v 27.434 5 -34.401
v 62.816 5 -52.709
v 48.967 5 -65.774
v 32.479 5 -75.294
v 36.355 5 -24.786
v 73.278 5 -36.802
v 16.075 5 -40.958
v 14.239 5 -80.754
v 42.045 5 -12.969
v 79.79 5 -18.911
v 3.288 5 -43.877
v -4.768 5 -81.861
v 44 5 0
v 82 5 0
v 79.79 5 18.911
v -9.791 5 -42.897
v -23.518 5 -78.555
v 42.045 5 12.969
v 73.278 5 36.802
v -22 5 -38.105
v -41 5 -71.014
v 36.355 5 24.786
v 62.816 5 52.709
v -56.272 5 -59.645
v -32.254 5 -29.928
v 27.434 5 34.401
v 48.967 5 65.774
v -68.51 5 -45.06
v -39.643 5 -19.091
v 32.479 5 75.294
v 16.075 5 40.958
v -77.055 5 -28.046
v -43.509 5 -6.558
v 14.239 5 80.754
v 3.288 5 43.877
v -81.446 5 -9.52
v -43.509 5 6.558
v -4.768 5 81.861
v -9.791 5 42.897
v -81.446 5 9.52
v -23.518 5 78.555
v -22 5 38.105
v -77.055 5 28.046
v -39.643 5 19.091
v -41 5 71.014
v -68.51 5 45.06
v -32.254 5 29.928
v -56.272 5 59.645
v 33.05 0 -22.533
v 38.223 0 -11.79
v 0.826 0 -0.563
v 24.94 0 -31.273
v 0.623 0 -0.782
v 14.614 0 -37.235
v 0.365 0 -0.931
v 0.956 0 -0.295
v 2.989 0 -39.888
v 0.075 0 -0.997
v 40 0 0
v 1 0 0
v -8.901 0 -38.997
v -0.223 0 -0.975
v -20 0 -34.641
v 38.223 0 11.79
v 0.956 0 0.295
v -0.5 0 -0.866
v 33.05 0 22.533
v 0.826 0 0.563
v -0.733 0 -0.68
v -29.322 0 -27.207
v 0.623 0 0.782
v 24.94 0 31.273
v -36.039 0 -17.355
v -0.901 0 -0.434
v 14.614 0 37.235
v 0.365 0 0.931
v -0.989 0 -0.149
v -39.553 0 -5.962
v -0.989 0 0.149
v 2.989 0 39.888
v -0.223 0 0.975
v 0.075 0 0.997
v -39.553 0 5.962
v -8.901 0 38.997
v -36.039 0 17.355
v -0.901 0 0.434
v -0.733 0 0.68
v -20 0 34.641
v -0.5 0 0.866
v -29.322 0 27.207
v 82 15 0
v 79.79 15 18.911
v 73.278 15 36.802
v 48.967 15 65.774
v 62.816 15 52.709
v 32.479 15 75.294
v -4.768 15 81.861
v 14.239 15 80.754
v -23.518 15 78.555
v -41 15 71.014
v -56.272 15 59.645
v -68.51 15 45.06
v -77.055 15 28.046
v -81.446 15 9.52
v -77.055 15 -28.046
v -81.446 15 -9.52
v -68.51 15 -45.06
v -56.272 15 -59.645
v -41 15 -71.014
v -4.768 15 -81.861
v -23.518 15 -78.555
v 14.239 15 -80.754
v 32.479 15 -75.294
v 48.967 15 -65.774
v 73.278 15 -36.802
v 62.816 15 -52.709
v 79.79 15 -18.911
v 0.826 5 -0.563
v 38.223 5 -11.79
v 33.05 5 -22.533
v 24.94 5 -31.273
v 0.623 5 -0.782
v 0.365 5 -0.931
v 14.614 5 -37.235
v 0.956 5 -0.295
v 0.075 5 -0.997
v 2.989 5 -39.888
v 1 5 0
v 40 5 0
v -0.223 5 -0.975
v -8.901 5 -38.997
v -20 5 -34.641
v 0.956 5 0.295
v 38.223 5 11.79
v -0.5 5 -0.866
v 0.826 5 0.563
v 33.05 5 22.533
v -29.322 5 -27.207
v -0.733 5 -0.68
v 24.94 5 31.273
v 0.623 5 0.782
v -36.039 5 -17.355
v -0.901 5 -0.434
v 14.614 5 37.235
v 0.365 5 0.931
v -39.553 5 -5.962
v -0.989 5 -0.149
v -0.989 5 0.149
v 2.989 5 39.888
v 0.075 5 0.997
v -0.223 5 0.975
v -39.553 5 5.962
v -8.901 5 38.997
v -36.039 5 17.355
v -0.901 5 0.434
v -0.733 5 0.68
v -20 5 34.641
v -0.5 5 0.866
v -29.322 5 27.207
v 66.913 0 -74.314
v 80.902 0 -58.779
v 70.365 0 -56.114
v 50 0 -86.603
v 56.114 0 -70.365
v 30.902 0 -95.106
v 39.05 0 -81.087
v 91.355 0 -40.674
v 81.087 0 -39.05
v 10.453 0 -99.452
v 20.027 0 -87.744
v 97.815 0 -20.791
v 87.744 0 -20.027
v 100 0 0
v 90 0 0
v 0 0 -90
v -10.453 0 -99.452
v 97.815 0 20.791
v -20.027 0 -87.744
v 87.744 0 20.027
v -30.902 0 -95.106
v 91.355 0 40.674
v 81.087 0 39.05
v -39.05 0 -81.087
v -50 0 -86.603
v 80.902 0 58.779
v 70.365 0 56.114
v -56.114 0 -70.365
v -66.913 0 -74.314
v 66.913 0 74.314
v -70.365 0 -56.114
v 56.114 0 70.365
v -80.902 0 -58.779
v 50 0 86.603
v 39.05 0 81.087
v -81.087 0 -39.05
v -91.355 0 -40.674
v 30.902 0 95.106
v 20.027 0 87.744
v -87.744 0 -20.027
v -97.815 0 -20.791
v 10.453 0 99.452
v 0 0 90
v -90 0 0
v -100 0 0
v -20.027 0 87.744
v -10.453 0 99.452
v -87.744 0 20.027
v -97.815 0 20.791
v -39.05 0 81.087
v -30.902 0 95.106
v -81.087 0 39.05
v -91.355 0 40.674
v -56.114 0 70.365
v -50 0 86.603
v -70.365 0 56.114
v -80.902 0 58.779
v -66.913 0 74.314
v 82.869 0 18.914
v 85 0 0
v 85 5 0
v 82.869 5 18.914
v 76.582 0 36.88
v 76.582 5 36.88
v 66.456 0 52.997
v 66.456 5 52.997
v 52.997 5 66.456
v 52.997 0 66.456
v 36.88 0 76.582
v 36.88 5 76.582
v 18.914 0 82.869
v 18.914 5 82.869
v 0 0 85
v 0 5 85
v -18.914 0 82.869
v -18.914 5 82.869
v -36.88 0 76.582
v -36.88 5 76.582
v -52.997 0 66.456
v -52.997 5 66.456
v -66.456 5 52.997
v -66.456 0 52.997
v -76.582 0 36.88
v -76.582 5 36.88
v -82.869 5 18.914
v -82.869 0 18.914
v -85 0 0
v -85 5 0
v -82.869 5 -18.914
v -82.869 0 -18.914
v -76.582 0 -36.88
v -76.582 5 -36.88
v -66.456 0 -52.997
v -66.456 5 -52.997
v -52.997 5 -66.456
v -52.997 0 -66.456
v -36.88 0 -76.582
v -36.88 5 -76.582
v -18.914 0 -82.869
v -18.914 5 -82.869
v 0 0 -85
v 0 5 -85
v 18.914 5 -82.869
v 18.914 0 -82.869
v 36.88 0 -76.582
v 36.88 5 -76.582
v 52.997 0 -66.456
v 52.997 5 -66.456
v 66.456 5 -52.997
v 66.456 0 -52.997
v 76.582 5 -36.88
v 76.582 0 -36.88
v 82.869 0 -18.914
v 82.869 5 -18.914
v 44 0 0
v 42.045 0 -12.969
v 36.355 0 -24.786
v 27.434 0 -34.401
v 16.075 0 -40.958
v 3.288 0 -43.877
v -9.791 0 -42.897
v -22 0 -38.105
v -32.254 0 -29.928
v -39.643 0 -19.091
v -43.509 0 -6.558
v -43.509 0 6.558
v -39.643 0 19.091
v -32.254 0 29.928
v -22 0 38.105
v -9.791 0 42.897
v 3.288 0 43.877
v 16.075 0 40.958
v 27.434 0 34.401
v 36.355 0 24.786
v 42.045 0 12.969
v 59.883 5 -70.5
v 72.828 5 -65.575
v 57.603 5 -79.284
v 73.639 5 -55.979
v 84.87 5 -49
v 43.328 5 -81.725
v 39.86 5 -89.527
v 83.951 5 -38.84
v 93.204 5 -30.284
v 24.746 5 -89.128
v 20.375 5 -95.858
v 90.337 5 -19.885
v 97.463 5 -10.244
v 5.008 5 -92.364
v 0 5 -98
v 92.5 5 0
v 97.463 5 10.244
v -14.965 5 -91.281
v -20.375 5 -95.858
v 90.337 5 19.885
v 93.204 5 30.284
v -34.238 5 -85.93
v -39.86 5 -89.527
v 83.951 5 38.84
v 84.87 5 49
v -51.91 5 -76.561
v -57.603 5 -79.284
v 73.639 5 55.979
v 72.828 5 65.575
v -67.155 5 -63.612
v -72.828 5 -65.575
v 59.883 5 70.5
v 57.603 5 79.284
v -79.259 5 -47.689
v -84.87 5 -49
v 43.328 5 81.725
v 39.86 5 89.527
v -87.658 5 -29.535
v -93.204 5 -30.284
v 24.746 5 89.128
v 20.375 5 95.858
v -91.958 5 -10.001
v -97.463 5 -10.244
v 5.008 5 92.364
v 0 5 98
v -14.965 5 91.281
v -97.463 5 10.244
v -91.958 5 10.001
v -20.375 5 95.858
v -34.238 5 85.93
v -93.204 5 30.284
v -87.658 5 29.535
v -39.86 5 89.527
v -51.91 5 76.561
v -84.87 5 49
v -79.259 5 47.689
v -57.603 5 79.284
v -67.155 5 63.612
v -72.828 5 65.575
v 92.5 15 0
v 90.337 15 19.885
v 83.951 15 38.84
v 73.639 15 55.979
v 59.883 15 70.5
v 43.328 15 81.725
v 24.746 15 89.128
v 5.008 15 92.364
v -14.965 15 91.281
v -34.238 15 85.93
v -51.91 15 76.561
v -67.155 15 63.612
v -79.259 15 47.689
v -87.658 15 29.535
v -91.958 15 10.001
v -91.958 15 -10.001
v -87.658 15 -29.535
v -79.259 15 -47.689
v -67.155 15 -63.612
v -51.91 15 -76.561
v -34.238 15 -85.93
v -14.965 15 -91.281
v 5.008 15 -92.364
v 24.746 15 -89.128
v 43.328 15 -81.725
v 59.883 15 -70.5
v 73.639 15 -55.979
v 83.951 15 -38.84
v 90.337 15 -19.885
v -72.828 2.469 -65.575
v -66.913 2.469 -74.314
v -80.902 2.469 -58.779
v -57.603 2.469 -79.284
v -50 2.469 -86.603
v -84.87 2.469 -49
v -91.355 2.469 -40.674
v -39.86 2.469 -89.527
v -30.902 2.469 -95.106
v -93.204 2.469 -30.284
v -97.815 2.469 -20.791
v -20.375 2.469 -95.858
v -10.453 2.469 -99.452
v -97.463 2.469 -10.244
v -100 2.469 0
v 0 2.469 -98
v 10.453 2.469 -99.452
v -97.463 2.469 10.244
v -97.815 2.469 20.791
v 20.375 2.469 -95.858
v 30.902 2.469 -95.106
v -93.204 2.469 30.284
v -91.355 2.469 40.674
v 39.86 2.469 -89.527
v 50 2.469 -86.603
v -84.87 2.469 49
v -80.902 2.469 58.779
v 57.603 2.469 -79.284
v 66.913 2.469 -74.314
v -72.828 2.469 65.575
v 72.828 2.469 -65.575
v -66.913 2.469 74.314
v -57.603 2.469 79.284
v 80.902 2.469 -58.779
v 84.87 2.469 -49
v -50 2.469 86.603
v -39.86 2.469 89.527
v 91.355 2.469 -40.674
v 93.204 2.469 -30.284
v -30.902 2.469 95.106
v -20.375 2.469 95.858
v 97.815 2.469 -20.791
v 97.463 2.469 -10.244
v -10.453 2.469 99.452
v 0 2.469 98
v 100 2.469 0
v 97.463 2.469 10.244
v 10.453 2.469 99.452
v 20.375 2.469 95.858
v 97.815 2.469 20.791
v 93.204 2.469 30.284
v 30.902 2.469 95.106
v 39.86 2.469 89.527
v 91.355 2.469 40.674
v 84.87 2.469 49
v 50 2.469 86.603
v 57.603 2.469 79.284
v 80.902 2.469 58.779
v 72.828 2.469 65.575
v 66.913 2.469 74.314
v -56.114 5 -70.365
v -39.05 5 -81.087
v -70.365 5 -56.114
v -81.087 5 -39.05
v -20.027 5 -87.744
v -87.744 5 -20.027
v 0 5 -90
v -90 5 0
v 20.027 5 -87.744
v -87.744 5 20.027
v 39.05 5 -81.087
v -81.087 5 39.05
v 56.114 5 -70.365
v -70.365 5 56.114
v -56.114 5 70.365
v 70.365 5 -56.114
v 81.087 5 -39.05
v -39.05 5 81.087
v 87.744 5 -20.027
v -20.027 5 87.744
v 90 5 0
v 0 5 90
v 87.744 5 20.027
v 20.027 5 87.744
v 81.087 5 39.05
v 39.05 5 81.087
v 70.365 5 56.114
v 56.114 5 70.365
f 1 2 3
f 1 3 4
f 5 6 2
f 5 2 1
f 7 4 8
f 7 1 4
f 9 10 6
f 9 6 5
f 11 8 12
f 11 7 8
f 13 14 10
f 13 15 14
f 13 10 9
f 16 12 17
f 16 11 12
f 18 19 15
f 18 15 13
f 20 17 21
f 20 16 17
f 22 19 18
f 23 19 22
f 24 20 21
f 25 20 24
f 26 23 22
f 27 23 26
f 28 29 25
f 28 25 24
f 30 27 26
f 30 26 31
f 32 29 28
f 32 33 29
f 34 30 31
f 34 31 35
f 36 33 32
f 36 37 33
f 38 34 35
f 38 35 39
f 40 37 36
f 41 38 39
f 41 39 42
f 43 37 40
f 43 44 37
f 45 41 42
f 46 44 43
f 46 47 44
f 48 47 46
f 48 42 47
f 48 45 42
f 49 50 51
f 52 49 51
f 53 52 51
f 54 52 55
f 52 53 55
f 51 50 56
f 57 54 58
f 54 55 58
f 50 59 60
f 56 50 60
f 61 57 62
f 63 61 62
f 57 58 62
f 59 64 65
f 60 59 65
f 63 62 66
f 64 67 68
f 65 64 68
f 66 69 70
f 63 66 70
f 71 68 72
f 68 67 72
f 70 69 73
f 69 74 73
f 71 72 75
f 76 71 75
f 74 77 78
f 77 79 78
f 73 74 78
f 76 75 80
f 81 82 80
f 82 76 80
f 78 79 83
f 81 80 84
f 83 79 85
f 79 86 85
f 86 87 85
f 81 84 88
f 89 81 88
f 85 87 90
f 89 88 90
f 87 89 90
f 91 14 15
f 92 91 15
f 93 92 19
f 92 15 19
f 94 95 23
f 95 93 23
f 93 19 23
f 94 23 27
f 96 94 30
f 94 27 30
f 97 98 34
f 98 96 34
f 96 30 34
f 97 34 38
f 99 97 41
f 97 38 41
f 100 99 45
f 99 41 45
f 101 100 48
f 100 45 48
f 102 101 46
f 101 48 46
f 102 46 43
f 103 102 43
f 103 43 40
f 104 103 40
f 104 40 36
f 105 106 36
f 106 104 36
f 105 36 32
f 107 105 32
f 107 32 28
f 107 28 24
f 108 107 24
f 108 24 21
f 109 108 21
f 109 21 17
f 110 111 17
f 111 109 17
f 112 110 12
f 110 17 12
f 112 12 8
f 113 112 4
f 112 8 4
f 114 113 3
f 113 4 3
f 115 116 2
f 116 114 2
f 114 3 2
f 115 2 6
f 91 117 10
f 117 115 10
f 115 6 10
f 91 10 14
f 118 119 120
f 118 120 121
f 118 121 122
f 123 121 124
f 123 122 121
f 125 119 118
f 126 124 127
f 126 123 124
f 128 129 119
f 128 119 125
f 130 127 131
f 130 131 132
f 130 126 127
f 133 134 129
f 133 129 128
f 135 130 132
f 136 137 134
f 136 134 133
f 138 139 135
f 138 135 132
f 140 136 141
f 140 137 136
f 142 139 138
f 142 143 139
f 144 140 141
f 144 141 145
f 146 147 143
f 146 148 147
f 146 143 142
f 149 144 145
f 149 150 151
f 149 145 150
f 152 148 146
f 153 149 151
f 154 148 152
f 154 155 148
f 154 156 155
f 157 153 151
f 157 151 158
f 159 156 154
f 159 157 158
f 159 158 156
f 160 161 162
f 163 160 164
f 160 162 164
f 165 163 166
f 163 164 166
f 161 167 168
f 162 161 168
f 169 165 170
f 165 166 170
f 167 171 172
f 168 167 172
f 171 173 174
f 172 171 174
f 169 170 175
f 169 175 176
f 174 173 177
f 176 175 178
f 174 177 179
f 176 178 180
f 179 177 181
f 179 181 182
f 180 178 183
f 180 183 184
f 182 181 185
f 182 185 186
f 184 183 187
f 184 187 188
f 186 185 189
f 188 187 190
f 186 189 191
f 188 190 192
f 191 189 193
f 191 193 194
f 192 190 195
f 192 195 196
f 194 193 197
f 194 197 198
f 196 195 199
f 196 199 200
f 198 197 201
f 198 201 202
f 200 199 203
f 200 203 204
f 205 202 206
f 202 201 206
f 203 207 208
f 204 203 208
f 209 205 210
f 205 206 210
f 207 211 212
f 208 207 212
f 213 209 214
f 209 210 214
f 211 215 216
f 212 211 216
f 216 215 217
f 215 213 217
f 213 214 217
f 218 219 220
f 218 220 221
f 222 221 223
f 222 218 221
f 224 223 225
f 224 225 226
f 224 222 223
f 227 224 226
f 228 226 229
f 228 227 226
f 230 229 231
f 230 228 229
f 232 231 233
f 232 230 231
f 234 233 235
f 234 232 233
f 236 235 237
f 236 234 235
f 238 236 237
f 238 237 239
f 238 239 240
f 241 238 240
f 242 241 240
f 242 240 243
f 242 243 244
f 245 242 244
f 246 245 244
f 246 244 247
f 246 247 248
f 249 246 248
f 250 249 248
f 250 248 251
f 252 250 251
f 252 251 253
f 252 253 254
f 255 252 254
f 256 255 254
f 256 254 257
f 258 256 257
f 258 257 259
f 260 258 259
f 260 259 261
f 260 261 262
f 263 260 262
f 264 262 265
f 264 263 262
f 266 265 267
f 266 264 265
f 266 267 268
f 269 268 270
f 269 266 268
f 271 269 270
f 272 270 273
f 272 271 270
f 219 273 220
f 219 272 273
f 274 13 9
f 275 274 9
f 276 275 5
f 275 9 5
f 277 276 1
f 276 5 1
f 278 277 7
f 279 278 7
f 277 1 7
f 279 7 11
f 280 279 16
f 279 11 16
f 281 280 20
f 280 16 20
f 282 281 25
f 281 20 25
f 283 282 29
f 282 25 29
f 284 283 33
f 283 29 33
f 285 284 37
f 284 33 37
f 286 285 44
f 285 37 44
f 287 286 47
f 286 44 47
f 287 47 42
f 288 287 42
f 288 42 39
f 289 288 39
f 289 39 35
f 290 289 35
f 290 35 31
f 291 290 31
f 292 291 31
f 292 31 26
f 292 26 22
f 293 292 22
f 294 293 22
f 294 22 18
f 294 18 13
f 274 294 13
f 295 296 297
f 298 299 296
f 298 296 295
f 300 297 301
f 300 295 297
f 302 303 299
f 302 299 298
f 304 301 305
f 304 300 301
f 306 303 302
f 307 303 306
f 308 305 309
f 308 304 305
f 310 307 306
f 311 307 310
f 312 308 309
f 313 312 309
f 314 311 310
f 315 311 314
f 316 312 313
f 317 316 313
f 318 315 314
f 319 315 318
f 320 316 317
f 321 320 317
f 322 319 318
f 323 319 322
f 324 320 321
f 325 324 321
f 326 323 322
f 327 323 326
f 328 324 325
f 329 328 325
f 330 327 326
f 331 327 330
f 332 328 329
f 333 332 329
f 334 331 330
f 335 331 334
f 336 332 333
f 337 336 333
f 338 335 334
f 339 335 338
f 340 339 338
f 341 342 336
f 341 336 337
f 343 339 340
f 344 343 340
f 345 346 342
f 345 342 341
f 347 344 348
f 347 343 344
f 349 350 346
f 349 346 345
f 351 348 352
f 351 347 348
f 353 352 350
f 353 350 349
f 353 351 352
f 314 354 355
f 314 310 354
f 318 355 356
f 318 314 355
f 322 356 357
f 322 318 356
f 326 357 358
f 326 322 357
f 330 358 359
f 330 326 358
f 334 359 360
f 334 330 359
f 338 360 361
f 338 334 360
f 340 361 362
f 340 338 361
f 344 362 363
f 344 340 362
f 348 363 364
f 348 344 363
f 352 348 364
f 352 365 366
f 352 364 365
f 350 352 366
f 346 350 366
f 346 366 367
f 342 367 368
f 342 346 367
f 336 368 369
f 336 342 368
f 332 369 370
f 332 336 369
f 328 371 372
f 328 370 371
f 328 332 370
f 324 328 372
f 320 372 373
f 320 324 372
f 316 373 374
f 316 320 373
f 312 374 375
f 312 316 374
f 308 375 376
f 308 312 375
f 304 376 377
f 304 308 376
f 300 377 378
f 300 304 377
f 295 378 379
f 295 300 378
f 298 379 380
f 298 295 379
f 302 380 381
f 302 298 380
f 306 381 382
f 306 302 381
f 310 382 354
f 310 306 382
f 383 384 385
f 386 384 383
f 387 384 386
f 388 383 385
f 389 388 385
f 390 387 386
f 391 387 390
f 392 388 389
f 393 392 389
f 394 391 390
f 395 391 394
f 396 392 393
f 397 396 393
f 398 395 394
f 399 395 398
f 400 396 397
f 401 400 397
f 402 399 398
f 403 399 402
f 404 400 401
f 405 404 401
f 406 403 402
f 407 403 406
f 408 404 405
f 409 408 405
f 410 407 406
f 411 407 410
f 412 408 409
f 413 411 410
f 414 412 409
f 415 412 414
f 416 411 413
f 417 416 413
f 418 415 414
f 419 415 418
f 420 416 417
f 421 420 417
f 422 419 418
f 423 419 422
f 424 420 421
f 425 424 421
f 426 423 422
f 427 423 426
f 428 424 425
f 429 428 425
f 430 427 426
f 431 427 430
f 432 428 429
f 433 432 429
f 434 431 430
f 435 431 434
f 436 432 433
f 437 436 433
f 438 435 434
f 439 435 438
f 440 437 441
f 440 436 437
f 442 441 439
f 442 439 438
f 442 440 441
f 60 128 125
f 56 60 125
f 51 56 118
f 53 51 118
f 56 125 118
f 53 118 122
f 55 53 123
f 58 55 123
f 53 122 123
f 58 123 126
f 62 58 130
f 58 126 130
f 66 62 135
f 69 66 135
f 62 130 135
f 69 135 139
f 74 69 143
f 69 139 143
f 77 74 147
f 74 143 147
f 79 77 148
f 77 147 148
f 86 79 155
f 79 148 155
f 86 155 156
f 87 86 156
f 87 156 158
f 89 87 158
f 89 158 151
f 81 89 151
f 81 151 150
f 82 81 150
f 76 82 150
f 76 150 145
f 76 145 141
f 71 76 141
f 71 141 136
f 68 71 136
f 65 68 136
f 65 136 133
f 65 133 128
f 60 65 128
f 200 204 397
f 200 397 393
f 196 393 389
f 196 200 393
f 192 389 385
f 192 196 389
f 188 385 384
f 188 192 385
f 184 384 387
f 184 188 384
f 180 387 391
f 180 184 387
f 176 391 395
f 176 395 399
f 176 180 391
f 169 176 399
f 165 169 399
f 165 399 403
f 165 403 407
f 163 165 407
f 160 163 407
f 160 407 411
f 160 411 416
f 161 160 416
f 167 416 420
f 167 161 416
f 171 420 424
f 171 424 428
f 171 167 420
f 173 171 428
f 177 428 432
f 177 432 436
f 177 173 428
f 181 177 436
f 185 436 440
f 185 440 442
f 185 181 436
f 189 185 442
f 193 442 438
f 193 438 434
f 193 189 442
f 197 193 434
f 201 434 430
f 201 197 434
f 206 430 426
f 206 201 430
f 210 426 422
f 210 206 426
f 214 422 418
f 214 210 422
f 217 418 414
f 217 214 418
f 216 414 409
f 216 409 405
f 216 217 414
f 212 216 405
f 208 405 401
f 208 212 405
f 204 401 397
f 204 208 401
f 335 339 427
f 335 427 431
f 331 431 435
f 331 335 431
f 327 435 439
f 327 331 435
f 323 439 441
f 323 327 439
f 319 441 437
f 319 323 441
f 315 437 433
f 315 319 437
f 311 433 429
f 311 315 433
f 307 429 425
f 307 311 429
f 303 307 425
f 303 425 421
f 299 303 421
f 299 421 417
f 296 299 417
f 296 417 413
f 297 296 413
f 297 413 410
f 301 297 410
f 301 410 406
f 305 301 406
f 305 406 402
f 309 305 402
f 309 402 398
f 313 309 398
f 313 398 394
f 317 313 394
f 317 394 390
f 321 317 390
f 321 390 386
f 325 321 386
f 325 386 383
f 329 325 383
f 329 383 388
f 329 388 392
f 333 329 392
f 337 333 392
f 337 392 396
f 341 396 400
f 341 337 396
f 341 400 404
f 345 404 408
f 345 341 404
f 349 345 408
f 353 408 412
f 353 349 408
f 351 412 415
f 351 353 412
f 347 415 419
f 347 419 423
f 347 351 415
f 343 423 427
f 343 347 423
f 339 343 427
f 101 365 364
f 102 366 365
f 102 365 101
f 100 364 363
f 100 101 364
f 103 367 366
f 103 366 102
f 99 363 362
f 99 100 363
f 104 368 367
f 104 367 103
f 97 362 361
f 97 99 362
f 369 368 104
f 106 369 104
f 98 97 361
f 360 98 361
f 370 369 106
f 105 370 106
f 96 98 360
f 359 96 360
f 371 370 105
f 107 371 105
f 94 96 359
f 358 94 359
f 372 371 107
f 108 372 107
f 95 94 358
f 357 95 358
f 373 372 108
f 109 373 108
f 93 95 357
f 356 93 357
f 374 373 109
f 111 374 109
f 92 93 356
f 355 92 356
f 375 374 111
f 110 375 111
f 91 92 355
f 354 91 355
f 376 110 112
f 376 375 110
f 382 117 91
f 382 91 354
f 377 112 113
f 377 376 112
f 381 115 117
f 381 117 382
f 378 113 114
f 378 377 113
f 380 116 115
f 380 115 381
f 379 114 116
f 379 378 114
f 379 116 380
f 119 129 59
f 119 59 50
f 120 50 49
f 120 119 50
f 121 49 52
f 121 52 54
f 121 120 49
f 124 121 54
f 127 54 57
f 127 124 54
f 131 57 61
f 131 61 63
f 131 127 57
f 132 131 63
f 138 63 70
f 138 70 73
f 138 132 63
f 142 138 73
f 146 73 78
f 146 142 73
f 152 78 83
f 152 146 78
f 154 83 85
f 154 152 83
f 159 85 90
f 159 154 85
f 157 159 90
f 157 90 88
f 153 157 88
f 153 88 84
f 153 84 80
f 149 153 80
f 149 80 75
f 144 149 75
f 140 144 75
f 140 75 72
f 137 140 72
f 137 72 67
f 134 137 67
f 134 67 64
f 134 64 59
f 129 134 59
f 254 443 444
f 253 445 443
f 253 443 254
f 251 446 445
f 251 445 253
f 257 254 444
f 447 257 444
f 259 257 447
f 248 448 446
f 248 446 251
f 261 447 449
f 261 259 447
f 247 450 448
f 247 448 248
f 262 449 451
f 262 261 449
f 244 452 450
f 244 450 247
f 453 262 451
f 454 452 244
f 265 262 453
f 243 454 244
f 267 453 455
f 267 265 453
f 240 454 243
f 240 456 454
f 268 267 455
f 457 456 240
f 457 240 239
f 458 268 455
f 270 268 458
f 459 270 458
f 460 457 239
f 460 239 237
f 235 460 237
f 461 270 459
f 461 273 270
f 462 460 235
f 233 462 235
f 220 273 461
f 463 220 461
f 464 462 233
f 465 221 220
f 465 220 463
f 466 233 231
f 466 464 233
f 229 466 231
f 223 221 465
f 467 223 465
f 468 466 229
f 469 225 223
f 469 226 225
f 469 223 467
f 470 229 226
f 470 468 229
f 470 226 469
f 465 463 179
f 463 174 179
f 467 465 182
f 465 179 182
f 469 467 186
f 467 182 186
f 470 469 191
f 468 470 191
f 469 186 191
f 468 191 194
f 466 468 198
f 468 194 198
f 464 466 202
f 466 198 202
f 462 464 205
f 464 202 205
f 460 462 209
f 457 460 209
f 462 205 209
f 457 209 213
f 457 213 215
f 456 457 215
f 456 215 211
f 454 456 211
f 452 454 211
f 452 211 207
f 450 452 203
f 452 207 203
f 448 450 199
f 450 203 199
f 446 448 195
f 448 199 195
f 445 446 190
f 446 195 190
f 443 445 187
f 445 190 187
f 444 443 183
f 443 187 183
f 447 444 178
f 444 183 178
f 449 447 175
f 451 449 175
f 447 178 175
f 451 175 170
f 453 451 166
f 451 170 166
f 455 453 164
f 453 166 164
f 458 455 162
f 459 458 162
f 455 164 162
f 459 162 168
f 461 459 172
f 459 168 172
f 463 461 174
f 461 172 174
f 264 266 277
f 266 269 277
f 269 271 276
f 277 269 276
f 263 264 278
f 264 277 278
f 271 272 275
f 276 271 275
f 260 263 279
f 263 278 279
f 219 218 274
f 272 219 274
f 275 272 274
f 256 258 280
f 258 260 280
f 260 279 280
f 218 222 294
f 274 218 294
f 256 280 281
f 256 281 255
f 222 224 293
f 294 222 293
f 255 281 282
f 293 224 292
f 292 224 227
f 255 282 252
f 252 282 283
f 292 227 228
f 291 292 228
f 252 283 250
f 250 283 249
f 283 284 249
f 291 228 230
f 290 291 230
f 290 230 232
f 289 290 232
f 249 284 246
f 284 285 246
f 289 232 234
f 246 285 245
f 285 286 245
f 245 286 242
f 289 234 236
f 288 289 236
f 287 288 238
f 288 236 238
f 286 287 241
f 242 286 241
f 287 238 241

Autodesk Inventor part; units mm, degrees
ref_plane "YZ Plane" through (0, 0, 0) normal (1, 0, 0) x (0, 1, 0)
ref_plane "XZ Plane" through (0, 0, 0) normal (0, 1, 0) x (-1, 0, 0)
ref_plane "XY Plane" through (0, 0, 0) normal (0, 0, 1) x (1, 0, 0)
sketch "Sketch1" plane through (0, 0, 0) normal (0, 1, 0) x (-1, 0, 0)
  circle A0 centre (0, 0) radius 100
  dimension "d0" = 200
extrude "Extrusion1" add sketch "Sketch1" along normal blind 5
sketch "Sketch8" plane through (0, 5, 0) normal (0, 1, 0) x (1, 0, 0)
  circle A0 centre (0, 0) radius 1
  circle A1 centre (42, 0) radius 1
  circle A2 centre (-21, 36.3731) radius 1
  circle A3 centre (-21, -36.3731) radius 1
  circle A4 centre (0, 0) radius 44
  circle A5 centre (0, 0) radius 40
  point P0 (-20.5, -35.507)
  point P1 (-20.5, 35.507)
  point P2 (-21.5, 37.2391)
  point P3 (-21.5, -37.2391)
  point P4 (41, 0)
  point P5 (43, 0)
  dimension "d17" = 2
  dimension "d18" = 2
  dimension "d19" = 42
  dimension "d22" = 360
  dimension "d46" = 88
  dimension "d47" = 80
sketch "Sketch9" plane through (0, 5, 0) normal (0, 1, 0) x (1, 0, 0)
  line L0 (80.8862, 2.8807) -> (72.2256, 0)
  line L1 (72.2256, 0) -> (80.8409, -3.9526)
  line L2 (80.3024, 10.1197) -> (71.9349, 6.4743)
  line L3 (71.9349, 6.4743) -> (80.8698, 3.3098)
  line L4 (79.072, 17.2772) -> (71.0649, 12.8964)
  line L5 (71.0649, 12.8964) -> (80.2475, 10.5456)
  line L6 (77.2049, 24.2956) -> (69.6228, 19.2147)
  line L7 (69.6228, 19.2147) -> (78.9792, 17.6965)
  line L8 (74.7163, 31.1184) -> (67.6202, 25.3783)
  line L9 (67.6202, 25.3783) -> (77.0749, 24.7049)
  line L10 (71.6261, 37.6906) -> (65.0731, 31.3375)
  line L11 (65.0731, 31.3375) -> (74.5501, 31.5144)
  line L12 (67.9592, 43.9594) -> (62.002, 37.0445)
  line L13 (62.002, 37.0445) -> (71.4251, 38.0702)
  line L14 (63.7451, 49.8742) -> (58.4318, 42.4532)
  line L15 (58.4318, 42.4532) -> (67.725, 44.3194)
  line L16 (59.0178, 55.3875) -> (54.3911, 47.52)
  line L17 (54.3911, 47.52) -> (63.4796, 50.2118)
  line L18 (53.8153, 60.4549) -> (49.9124, 52.2043)
  line L19 (49.9124, 52.2043) -> (58.7231, 55.6999)
  line L20 (48.1795, 65.0355) -> (45.032, 56.4683)
  line L21 (45.032, 56.4683) -> (53.4938, 60.7396)
  line L22 (42.1558, 69.0924) -> (39.7889, 60.2776)
  line L23 (39.7889, 60.2776) -> (47.8338, 65.2902)
  line L24 (35.7927, 72.5931) -> (34.2255, 63.6016)
  line L25 (34.2255, 63.6016) -> (41.7886, 69.3151)
  line L26 (29.1415, 75.5093) -> (28.3865, 66.4135)
  line L27 (28.3865, 66.4135) -> (35.407, 72.782)
  line L28 (22.2555, 77.8175) -> (22.319, 68.6907)
  line L29 (22.319, 68.6907) -> (28.7404, 75.6629)
  line L30 (15.1904, 79.4992) -> (16.0717, 70.4148)
  line L31 (16.0717, 70.4148) -> (21.8423, 77.9345)
  line L32 (8.003, 80.5409) -> (9.6951, 71.572)
  line L33 (9.6951, 71.572) -> (14.7684, 79.5787)
  line L34 (0.7512, 80.934) -> (3.2404, 72.1529)
  line L35 (3.2404, 72.1529) -> (7.5755, 80.5822)
  line L36 (-6.5067, 80.6755) -> (-3.2404, 72.1529)
  line L37 (-3.2404, 72.1529) -> (0.3217, 80.9369)
  line L38 (-13.7122, 79.7675) -> (-9.6951, 71.572)
  line L39 (-9.6951, 71.572) -> (-6.9347, 80.6399)
  line L40 (-20.8073, 78.2172) -> (-16.0717, 70.4148)
  line L41 (-16.0717, 70.4148) -> (-14.1353, 79.6936)
  line L42 (-27.7349, 76.0372) -> (-22.319, 68.6907)
  line L43 (-22.319, 68.6907) -> (-21.2221, 78.1057)
  line L44 (-34.4392, 73.245) -> (-28.3865, 66.4135)
  line L45 (-28.3865, 66.4135) -> (-28.138, 75.8889)
  line L46 (-40.8661, 69.863) -> (-34.2255, 63.6016)
  line L47 (-34.2255, 63.6016) -> (-34.8273, 73.0612)
  line L48 (-46.9641, 65.9185) -> (-39.7889, 60.2776)
  line L49 (-39.7889, 60.2776) -> (-41.2363, 69.6452)
  line L50 (-52.6839, 61.4433) -> (-45.032, 56.4683)
  line L51 (-45.032, 56.4683) -> (-47.3132, 65.6684)
  line L52 (-57.9796, 56.4734) -> (-49.9124, 52.2043)
  line L53 (-49.9124, 52.2043) -> (-53.0092, 61.1629)
  line L54 (-62.8084, 51.0488) -> (-54.3911, 47.52)
  line L55 (-54.3911, 47.52) -> (-58.2784, 56.165)
  line L56 (-67.1315, 45.2132) -> (-58.4318, 42.4532)
  line L57 (-58.4318, 42.4532) -> (-63.0784, 50.7148)
  line L58 (-70.9142, 39.0136) -> (-62.002, 37.0445)
  line L59 (-62.002, 37.0445) -> (-67.3705, 44.8564)
  line L60 (-74.1258, 32.4998) -> (-65.0731, 31.3375)
  line L61 (-65.0731, 31.3375) -> (-71.1202, 38.6367)
  line L62 (-76.7407, 25.7244) -> (-67.6202, 25.3783)
  line L63 (-67.6202, 25.3783) -> (-74.2973, 32.106)
  line L64 (-78.7377, 18.7419) -> (-69.6228, 19.2147)
  line L65 (-69.6228, 19.2147) -> (-76.8761, 25.3168)
  line L66 (-80.1007, 11.6084) -> (-71.0649, 12.8964)
  line L67 (-71.0649, 12.8964) -> (-78.836, 18.3238)
  line L68 (-80.8188, 4.3815) -> (-71.9349, 6.4743)
  line L69 (-71.9349, 6.4743) -> (-80.1612, 11.1832)
  line L70 (-80.8862, -2.8807) -> (-72.2256, 0)
  line L71 (-72.2256, 0) -> (-80.8409, 3.9526)
  line L72 (-80.3024, -10.1197) -> (-71.9349, -6.4743)
  line L73 (-71.9349, -6.4743) -> (-80.8698, -3.3098)
  line L74 (-79.072, -17.2772) -> (-71.0649, -12.8964)
  line L75 (-71.0649, -12.8964) -> (-80.2475, -10.5456)
  line L76 (-77.2049, -24.2956) -> (-69.6228, -19.2147)
  line L77 (-69.6228, -19.2147) -> (-78.9792, -17.6965)
  line L78 (-74.7163, -31.1184) -> (-67.6202, -25.3783)
  line L79 (-67.6202, -25.3783) -> (-77.0749, -24.7049)
  line L80 (-71.6261, -37.6906) -> (-65.0731, -31.3375)
  line L81 (-65.0731, -31.3375) -> (-74.5501, -31.5144)
  line L82 (-67.9592, -43.9594) -> (-62.002, -37.0445)
  line L83 (-62.002, -37.0445) -> (-71.4251, -38.0702)
  line L84 (-63.7451, -49.8742) -> (-58.4318, -42.4532)
  line L85 (-58.4318, -42.4532) -> (-67.725, -44.3194)
  line L86 (-59.0178, -55.3875) -> (-54.3911, -47.52)
  line L87 (-54.3911, -47.52) -> (-63.4796, -50.2118)
  line L88 (-53.8153, -60.4549) -> (-49.9124, -52.2043)
  line L89 (-49.9124, -52.2043) -> (-58.7231, -55.6999)
  line L90 (-48.1795, -65.0355) -> (-45.032, -56.4683)
  line L91 (-45.032, -56.4683) -> (-53.4938, -60.7396)
  line L92 (-42.1558, -69.0924) -> (-39.7889, -60.2776)
  line L93 (-39.7889, -60.2776) -> (-47.8338, -65.2902)
  line L94 (-35.7927, -72.5931) -> (-34.2255, -63.6016)
  line L95 (-34.2255, -63.6016) -> (-41.7886, -69.3151)
  line L96 (-29.1415, -75.5093) -> (-28.3865, -66.4135)
  line L97 (-28.3865, -66.4135) -> (-35.407, -72.782)
  line L98 (-22.2555, -77.8175) -> (-22.319, -68.6907)
  line L99 (-22.319, -68.6907) -> (-28.7404, -75.6629)
  line L100 (-15.1904, -79.4992) -> (-16.0717, -70.4148)
  line L101 (-16.0717, -70.4148) -> (-21.8423, -77.9345)
  line L102 (-8.003, -80.5409) -> (-9.6951, -71.572)
  line L103 (-9.6951, -71.572) -> (-14.7684, -79.5787)
  line L104 (-0.7512, -80.934) -> (-3.2404, -72.1529)
  line L105 (-3.2404, -72.1529) -> (-7.5755, -80.5822)
  line L106 (6.5067, -80.6755) -> (3.2404, -72.1529)
  line L107 (3.2404, -72.1529) -> (-0.3217, -80.9369)
  line L108 (13.7122, -79.7675) -> (9.6951, -71.572)
  line L109 (9.6951, -71.572) -> (6.9347, -80.6399)
  line L110 (20.8073, -78.2172) -> (16.0717, -70.4148)
  line L111 (16.0717, -70.4148) -> (14.1353, -79.6936)
  line L112 (27.7349, -76.0372) -> (22.319, -68.6907)
  line L113 (22.319, -68.6907) -> (21.2221, -78.1057)
  line L114 (34.4392, -73.245) -> (28.3865, -66.4135)
  line L115 (28.3865, -66.4135) -> (28.138, -75.8889)
  line L116 (40.8661, -69.863) -> (34.2255, -63.6016)
  line L117 (34.2255, -63.6016) -> (34.8273, -73.0612)
  line L118 (46.9641, -65.9185) -> (39.7889, -60.2776)
  line L119 (39.7889, -60.2776) -> (41.2363, -69.6452)
  line L120 (52.6839, -61.4433) -> (45.032, -56.4683)
  line L121 (45.032, -56.4683) -> (47.3132, -65.6684)
  line L122 (57.9796, -56.4734) -> (49.9124, -52.2043)
  line L123 (49.9124, -52.2043) -> (53.0092, -61.1629)
  line L124 (62.8084, -51.0488) -> (54.3911, -47.52)
  line L125 (54.3911, -47.52) -> (58.2784, -56.165)
  line L126 (67.1315, -45.2132) -> (58.4318, -42.4532)
  line L127 (58.4318, -42.4532) -> (63.0784, -50.7148)
  line L128 (70.9142, -39.0136) -> (62.002, -37.0445)
  line L129 (62.002, -37.0445) -> (67.3705, -44.8564)
  line L130 (74.1258, -32.4998) -> (65.0731, -31.3375)
  line L131 (65.0731, -31.3375) -> (71.1202, -38.6367)
  line L132 (76.7407, -25.7244) -> (67.6202, -25.3783)
  line L133 (67.6202, -25.3783) -> (74.2973, -32.106)
  line L134 (78.7377, -18.7419) -> (69.6228, -19.2147)
  line L135 (69.6228, -19.2147) -> (76.8761, -25.3168)
  line L136 (80.1007, -11.6084) -> (71.0649, -12.8964)
  line L137 (71.0649, -12.8964) -> (78.836, -18.3238)
  line L138 (80.8188, -4.3815) -> (71.9349, -6.4743)
  line L139 (71.9349, -6.4743) -> (80.1612, -11.1832)
  circle A0 centre (0, 0) radius 92.5
  arc A1 (-20.8073, 78.2172) -> (-21.2221, 78.1057) centre (0, 0) ccw
  arc A2 (-27.7349, 76.0372) -> (-28.138, 75.8889) centre (0, 0) ccw
  arc A3 (-34.4392, 73.245) -> (-34.8273, 73.0612) centre (0, 0) ccw
  arc A4 (-40.8661, 69.863) -> (-41.2363, 69.6452) centre (0, 0) ccw
  arc A5 (-67.9592, -43.9594) -> (-67.725, -44.3194) centre (0, 0) ccw
  arc A6 (-48.1795, -65.0355) -> (-47.8338, -65.2902) centre (0, 0) ccw
  arc A7 (-42.1558, -69.0924) -> (-41.7886, -69.3151) centre (0, 0) ccw
  arc A8 (-35.7927, -72.5931) -> (-35.407, -72.782) centre (0, 0) ccw
  arc A9 (-29.1415, -75.5093) -> (-28.7404, -75.6629) centre (0, 0) ccw
  arc A10 (-22.2555, -77.8175) -> (-21.8423, -77.9345) centre (0, 0) ccw
  arc A11 (-15.1904, -79.4992) -> (-14.7684, -79.5787) centre (0, 0) ccw
  arc A12 (-8.003, -80.5409) -> (-7.5755, -80.5822) centre (0, 0) ccw
  arc A13 (-0.7512, -80.934) -> (-0.3217, -80.9369) centre (0, 0) ccw
  arc A14 (6.5067, -80.6755) -> (6.9347, -80.6399) centre (0, 0) ccw
  arc A15 (13.7122, -79.7675) -> (14.1353, -79.6936) centre (0, 0) ccw
  arc A16 (20.8073, -78.2172) -> (21.2221, -78.1057) centre (0, 0) ccw
  arc A17 (27.7349, -76.0372) -> (28.138, -75.8889) centre (0, 0) ccw
  arc A18 (34.4392, -73.245) -> (34.8273, -73.0612) centre (0, 0) ccw
  arc A19 (40.8661, -69.863) -> (41.2363, -69.6452) centre (0, 0) ccw
  arc A20 (46.9641, -65.9185) -> (47.3132, -65.6684) centre (0, 0) ccw
  arc A21 (57.9796, -56.4734) -> (58.2784, -56.165) centre (0, 0) ccw
  arc A22 (62.8084, -51.0488) -> (63.0784, -50.7148) centre (0, 0) ccw
  arc A23 (67.1315, -45.2132) -> (67.3705, -44.8564) centre (0, 0) ccw
  arc A24 (70.9142, -39.0136) -> (71.1202, -38.6367) centre (0, 0) ccw
  arc A25 (74.1258, -32.4998) -> (74.2973, -32.106) centre (0, 0) ccw
  arc A26 (76.7407, -25.7244) -> (76.8761, -25.3168) centre (0, 0) ccw
  arc A27 (78.7377, -18.7419) -> (78.836, -18.3238) centre (0, 0) ccw
  arc A28 (80.1007, -11.6084) -> (80.1612, -11.1832) centre (0, 0) ccw
  arc A29 (80.8188, -4.3815) -> (80.8409, -3.9526) centre (0, 0) ccw
  arc A30 (80.8862, 2.8807) -> (80.8698, 3.3098) centre (0, 0) ccw
  arc A31 (80.3024, 10.1197) -> (80.2475, 10.5456) centre (0, 0) ccw
  arc A32 (79.072, 17.2772) -> (78.9792, 17.6965) centre (0, 0) ccw
  arc A33 (77.2049, 24.2956) -> (77.0749, 24.7049) centre (0, 0) ccw
  arc A34 (74.7163, 31.1184) -> (74.5501, 31.5144) centre (0, 0) ccw
  arc A35 (71.6261, 37.6906) -> (71.4251, 38.0702) centre (0, 0) ccw
  arc A36 (67.9592, 43.9594) -> (67.725, 44.3194) centre (0, 0) ccw
  arc A37 (63.7451, 49.8742) -> (63.4796, 50.2118) centre (0, 0) ccw
  arc A38 (59.0178, 55.3875) -> (58.7231, 55.6999) centre (0, 0) ccw
  arc A39 (42.1558, 69.0924) -> (41.7886, 69.3151) centre (0, 0) ccw
  arc A40 (35.7927, 72.5931) -> (35.407, 72.782) centre (0, 0) ccw
  arc A41 (29.1415, 75.5093) -> (28.7404, 75.6629) centre (0, 0) ccw
  arc A42 (22.2555, 77.8175) -> (21.8423, 77.9345) centre (0, 0) ccw
  arc A43 (15.1904, 79.4992) -> (14.7684, 79.5787) centre (0, 0) ccw
  arc A44 (8.003, 80.5409) -> (7.5755, 80.5822) centre (0, 0) ccw
  arc A45 (0.7512, 80.934) -> (0.3217, 80.9369) centre (0, 0) ccw
  arc A46 (-6.5067, 80.6755) -> (-6.9347, 80.6399) centre (0, 0) ccw
  arc A47 (-13.7122, 79.7675) -> (-14.1353, 79.6936) centre (0, 0) ccw
  circle A48 centre (0, 0) radius 82
  dimension "d29" = 360
  dimension "d31" = 185
  dimension "d37" = 164
extrude "Extrusion4" add sketch "Sketch9" along normal blind 10
sketch "Sketch10" plane through (0, 0, 0) normal (1, 0, 0) x (0, 1, 0)
  line L0 (0, 100) -> (5, 100) projected
  line L1 (12.4688, 100) -> (2.4688, 100)
  line L2 (2.4688, 100) -> (2.4688, 98)
  line L3 (2.4688, 98) -> (12.4688, 98)
  line L4 (12.4688, 98) -> (12.4688, 100)
  line L5 (-2.4938, 0) -> (14.9625, 0) projected
  point P0 (0, 0)
  dimension "d34" = 2
  dimension "d35" = 10
revolve "Revolution2" cut sketch "Sketch10" angle 360 about axis through (0, -10, 0) along (0, 1, 0)
extrude "Extrusion5" cut sketch "Sketch8" against normal blind 5 contours A0
sketch "Sketch11" plane through (0, 0, 0) normal (0, -1, 0) x (1, 0, 0)
  circle A0 centre (0, 0) radius 90
  circle A1 centre (0, 0) radius 1 projected
  circle A2 centre (0, 0) radius 85
  dimension "d40" = 180
  dimension "d41" = 170
extrude "Extrusion6" cut sketch "Sketch11" against normal blind 5 contours A0
extrude "Extrusion7" cut sketch "Sketch8" against normal blind 10 contours A1 | A2 | A3
extrude "Extrusion8" cut sketch "Sketch8" against normal blind 10 contours A1 | A2 | A3 | A4
properties part number "PlanetarygearboxBase"
